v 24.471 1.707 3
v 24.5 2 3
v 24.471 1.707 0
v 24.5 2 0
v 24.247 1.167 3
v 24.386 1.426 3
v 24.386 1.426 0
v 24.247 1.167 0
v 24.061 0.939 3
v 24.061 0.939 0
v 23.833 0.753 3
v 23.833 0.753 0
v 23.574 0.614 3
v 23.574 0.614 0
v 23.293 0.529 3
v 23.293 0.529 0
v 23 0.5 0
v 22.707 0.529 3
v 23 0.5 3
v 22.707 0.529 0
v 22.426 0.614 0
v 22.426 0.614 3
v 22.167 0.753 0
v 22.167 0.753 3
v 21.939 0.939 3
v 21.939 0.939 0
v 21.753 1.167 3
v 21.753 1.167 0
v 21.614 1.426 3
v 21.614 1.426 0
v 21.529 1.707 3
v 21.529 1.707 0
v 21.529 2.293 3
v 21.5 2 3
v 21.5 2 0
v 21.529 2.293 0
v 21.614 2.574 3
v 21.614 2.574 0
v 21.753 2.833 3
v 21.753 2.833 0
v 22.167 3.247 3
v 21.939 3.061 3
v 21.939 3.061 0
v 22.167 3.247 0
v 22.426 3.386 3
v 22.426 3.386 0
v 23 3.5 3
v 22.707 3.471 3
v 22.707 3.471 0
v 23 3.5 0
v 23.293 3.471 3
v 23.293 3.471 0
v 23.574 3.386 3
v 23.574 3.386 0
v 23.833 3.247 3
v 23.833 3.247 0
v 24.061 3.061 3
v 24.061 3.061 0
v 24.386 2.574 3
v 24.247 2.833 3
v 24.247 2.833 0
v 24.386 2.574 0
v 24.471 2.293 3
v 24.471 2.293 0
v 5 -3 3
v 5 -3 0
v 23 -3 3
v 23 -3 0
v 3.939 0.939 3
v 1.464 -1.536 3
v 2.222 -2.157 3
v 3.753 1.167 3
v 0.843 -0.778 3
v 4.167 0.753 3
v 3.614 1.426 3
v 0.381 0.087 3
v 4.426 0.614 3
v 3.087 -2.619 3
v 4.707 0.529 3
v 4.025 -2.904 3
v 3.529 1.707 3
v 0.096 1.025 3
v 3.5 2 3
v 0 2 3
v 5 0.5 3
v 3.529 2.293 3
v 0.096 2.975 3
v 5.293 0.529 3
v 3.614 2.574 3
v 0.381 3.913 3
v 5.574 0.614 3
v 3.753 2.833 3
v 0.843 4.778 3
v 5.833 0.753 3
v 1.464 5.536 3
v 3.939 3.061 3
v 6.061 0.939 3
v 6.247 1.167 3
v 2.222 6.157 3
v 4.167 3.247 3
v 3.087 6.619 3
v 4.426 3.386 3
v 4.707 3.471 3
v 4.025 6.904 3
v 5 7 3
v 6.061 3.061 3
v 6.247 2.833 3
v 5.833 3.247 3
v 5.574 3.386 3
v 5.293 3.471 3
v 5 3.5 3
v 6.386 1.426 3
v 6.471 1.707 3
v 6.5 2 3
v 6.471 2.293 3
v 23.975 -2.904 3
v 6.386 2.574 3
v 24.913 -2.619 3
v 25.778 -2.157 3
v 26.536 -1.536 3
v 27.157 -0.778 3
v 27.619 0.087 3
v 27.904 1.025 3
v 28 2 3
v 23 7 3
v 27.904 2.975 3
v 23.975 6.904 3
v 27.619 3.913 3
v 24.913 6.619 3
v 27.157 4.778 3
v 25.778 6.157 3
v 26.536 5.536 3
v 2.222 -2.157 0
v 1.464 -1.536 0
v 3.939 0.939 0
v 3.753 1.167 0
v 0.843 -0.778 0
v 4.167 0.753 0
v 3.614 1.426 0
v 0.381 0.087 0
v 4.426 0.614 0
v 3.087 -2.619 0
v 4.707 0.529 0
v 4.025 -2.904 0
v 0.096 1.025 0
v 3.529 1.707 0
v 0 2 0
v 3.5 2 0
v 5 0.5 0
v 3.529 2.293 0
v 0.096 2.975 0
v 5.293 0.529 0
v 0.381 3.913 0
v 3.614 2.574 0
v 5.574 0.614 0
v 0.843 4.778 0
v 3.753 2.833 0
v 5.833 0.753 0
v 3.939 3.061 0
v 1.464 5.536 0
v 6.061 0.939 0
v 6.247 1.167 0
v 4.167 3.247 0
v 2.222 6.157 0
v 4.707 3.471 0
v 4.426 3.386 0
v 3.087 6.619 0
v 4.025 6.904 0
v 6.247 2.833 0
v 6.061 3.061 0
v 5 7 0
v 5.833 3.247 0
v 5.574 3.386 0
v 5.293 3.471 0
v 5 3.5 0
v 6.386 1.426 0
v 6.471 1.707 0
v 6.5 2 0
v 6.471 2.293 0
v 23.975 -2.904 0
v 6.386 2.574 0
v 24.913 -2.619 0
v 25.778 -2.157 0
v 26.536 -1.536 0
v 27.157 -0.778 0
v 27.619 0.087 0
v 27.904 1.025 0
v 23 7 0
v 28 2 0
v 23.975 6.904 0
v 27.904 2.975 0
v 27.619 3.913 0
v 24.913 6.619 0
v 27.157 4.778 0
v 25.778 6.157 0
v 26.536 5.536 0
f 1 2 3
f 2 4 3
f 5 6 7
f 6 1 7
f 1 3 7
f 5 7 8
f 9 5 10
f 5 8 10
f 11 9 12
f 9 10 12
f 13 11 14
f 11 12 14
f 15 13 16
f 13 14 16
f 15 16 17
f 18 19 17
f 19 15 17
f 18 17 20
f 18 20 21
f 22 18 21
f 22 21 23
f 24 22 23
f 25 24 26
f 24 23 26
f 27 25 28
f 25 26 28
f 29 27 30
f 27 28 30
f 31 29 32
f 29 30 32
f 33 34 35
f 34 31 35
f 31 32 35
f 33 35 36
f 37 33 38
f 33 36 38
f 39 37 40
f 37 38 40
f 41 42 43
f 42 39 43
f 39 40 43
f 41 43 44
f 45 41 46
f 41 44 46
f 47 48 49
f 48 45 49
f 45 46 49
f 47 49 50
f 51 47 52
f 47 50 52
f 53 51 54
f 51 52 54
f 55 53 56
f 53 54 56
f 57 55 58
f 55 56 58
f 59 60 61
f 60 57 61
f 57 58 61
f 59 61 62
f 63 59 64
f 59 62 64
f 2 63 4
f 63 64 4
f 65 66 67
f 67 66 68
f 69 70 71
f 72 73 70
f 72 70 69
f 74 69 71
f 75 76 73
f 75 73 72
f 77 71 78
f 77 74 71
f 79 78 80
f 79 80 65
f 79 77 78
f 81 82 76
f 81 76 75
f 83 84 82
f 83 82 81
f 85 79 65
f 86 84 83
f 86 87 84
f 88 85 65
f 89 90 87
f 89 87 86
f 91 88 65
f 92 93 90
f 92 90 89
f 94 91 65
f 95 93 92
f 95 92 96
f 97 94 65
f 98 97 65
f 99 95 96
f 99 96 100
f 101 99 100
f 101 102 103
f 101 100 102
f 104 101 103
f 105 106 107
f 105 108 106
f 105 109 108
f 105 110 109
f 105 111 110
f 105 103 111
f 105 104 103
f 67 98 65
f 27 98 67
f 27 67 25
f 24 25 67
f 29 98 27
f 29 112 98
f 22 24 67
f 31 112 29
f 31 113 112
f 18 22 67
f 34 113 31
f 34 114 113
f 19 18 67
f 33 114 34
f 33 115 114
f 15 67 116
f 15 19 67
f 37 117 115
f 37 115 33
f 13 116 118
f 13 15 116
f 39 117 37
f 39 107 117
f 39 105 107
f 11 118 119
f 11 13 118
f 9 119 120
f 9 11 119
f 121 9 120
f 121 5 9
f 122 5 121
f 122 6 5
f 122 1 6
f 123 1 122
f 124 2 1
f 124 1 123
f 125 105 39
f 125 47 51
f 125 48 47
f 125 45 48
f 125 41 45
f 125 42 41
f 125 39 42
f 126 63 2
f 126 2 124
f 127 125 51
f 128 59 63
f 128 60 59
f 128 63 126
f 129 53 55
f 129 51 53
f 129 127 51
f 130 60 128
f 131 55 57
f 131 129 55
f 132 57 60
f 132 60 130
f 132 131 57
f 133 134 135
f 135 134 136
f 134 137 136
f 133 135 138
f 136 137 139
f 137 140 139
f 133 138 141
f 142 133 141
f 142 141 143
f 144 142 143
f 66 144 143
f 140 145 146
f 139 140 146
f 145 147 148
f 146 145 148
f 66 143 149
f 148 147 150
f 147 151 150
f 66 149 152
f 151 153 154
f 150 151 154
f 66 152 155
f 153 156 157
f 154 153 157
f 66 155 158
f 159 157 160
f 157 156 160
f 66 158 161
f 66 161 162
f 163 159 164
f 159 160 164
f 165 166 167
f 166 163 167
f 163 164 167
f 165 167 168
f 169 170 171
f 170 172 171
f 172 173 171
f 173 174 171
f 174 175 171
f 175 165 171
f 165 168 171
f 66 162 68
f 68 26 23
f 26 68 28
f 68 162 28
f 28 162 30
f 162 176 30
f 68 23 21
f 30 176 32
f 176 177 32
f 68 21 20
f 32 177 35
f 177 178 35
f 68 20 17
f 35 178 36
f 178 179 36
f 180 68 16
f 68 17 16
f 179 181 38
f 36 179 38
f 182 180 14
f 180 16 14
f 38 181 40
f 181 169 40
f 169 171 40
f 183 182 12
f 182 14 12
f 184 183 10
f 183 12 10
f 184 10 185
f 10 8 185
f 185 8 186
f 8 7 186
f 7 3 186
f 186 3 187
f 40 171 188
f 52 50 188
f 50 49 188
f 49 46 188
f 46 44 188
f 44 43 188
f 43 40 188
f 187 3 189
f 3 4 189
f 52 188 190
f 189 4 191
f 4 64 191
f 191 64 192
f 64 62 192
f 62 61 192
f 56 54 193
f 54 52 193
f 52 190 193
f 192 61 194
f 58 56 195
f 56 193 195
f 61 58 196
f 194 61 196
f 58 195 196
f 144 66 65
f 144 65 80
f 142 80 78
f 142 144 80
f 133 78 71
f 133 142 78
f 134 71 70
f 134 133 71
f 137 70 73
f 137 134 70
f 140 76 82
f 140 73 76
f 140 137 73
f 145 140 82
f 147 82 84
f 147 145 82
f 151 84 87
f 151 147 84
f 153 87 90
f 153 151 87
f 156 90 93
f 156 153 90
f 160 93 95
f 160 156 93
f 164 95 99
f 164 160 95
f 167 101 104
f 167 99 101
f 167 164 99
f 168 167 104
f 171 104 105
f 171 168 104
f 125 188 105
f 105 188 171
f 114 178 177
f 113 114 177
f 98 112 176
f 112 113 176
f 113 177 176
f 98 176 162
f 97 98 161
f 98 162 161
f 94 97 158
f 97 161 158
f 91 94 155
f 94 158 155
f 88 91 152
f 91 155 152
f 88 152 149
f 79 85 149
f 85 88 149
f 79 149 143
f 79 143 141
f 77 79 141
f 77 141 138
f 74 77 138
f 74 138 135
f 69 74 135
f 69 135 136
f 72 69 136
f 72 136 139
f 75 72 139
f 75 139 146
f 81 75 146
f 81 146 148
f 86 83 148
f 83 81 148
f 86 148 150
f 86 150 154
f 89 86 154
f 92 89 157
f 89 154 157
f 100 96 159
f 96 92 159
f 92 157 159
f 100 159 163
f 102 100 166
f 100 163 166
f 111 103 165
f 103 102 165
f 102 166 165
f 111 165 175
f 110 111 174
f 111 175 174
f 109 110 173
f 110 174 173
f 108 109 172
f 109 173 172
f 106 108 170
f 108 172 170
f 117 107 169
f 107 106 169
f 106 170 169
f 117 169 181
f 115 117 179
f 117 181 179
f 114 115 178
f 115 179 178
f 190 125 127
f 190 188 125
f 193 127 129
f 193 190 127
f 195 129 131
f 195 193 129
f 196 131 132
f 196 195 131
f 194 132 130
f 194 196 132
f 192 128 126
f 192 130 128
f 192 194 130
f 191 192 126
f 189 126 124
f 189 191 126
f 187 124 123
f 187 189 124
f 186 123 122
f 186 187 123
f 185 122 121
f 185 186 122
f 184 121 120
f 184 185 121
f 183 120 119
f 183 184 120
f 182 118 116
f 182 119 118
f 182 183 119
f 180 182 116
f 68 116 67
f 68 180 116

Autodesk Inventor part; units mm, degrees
ref_plane "YZ Plane" through (0, 0, 0) normal (1, 0, 0) x (0, 1, 0)
ref_plane "XZ Plane" through (0, 0, 0) normal (0, 1, 0) x (-1, 0, 0)
ref_plane "XY Plane" through (0, 0, 0) normal (0, 0, 1) x (1, 0, 0)
sketch "Sketch1" plane through (0, 0, 0) normal (0, 0, 1) x (1, 0, 0)
  line L0 (5, -3) -> (23, -3)
  line L1 (28, 2) -> (28, 2)
  line L2 (23, 7) -> (5, 7)
  line L3 (0, 2) -> (0, 2)
  arc A0 (5, 7) -> (0, 2) centre (5, 2) ccw
  arc A1 (0, 2) -> (5, -3) centre (5, 2) ccw
  arc A2 (28, 2) -> (23, 7) centre (23, 2) ccw
  arc A3 (23, -3) -> (28, 2) centre (23, 2) ccw
  circle A4 centre (5, 2) radius 1.5
  circle A5 centre (23, 2) radius 1.5
  point P0 (0, -3)
  point P1 (28, -3)
  point P2 (0, 7)
  dimension "d0" = 28
  dimension "d1" = 10
  dimension "d2" = 5
  dimension "d4" = 3
  dimension "d5" = 3
extrude "Extrusion1" add sketch "Sketch1" along normal blind 3
properties part number "plastic_part_5"
